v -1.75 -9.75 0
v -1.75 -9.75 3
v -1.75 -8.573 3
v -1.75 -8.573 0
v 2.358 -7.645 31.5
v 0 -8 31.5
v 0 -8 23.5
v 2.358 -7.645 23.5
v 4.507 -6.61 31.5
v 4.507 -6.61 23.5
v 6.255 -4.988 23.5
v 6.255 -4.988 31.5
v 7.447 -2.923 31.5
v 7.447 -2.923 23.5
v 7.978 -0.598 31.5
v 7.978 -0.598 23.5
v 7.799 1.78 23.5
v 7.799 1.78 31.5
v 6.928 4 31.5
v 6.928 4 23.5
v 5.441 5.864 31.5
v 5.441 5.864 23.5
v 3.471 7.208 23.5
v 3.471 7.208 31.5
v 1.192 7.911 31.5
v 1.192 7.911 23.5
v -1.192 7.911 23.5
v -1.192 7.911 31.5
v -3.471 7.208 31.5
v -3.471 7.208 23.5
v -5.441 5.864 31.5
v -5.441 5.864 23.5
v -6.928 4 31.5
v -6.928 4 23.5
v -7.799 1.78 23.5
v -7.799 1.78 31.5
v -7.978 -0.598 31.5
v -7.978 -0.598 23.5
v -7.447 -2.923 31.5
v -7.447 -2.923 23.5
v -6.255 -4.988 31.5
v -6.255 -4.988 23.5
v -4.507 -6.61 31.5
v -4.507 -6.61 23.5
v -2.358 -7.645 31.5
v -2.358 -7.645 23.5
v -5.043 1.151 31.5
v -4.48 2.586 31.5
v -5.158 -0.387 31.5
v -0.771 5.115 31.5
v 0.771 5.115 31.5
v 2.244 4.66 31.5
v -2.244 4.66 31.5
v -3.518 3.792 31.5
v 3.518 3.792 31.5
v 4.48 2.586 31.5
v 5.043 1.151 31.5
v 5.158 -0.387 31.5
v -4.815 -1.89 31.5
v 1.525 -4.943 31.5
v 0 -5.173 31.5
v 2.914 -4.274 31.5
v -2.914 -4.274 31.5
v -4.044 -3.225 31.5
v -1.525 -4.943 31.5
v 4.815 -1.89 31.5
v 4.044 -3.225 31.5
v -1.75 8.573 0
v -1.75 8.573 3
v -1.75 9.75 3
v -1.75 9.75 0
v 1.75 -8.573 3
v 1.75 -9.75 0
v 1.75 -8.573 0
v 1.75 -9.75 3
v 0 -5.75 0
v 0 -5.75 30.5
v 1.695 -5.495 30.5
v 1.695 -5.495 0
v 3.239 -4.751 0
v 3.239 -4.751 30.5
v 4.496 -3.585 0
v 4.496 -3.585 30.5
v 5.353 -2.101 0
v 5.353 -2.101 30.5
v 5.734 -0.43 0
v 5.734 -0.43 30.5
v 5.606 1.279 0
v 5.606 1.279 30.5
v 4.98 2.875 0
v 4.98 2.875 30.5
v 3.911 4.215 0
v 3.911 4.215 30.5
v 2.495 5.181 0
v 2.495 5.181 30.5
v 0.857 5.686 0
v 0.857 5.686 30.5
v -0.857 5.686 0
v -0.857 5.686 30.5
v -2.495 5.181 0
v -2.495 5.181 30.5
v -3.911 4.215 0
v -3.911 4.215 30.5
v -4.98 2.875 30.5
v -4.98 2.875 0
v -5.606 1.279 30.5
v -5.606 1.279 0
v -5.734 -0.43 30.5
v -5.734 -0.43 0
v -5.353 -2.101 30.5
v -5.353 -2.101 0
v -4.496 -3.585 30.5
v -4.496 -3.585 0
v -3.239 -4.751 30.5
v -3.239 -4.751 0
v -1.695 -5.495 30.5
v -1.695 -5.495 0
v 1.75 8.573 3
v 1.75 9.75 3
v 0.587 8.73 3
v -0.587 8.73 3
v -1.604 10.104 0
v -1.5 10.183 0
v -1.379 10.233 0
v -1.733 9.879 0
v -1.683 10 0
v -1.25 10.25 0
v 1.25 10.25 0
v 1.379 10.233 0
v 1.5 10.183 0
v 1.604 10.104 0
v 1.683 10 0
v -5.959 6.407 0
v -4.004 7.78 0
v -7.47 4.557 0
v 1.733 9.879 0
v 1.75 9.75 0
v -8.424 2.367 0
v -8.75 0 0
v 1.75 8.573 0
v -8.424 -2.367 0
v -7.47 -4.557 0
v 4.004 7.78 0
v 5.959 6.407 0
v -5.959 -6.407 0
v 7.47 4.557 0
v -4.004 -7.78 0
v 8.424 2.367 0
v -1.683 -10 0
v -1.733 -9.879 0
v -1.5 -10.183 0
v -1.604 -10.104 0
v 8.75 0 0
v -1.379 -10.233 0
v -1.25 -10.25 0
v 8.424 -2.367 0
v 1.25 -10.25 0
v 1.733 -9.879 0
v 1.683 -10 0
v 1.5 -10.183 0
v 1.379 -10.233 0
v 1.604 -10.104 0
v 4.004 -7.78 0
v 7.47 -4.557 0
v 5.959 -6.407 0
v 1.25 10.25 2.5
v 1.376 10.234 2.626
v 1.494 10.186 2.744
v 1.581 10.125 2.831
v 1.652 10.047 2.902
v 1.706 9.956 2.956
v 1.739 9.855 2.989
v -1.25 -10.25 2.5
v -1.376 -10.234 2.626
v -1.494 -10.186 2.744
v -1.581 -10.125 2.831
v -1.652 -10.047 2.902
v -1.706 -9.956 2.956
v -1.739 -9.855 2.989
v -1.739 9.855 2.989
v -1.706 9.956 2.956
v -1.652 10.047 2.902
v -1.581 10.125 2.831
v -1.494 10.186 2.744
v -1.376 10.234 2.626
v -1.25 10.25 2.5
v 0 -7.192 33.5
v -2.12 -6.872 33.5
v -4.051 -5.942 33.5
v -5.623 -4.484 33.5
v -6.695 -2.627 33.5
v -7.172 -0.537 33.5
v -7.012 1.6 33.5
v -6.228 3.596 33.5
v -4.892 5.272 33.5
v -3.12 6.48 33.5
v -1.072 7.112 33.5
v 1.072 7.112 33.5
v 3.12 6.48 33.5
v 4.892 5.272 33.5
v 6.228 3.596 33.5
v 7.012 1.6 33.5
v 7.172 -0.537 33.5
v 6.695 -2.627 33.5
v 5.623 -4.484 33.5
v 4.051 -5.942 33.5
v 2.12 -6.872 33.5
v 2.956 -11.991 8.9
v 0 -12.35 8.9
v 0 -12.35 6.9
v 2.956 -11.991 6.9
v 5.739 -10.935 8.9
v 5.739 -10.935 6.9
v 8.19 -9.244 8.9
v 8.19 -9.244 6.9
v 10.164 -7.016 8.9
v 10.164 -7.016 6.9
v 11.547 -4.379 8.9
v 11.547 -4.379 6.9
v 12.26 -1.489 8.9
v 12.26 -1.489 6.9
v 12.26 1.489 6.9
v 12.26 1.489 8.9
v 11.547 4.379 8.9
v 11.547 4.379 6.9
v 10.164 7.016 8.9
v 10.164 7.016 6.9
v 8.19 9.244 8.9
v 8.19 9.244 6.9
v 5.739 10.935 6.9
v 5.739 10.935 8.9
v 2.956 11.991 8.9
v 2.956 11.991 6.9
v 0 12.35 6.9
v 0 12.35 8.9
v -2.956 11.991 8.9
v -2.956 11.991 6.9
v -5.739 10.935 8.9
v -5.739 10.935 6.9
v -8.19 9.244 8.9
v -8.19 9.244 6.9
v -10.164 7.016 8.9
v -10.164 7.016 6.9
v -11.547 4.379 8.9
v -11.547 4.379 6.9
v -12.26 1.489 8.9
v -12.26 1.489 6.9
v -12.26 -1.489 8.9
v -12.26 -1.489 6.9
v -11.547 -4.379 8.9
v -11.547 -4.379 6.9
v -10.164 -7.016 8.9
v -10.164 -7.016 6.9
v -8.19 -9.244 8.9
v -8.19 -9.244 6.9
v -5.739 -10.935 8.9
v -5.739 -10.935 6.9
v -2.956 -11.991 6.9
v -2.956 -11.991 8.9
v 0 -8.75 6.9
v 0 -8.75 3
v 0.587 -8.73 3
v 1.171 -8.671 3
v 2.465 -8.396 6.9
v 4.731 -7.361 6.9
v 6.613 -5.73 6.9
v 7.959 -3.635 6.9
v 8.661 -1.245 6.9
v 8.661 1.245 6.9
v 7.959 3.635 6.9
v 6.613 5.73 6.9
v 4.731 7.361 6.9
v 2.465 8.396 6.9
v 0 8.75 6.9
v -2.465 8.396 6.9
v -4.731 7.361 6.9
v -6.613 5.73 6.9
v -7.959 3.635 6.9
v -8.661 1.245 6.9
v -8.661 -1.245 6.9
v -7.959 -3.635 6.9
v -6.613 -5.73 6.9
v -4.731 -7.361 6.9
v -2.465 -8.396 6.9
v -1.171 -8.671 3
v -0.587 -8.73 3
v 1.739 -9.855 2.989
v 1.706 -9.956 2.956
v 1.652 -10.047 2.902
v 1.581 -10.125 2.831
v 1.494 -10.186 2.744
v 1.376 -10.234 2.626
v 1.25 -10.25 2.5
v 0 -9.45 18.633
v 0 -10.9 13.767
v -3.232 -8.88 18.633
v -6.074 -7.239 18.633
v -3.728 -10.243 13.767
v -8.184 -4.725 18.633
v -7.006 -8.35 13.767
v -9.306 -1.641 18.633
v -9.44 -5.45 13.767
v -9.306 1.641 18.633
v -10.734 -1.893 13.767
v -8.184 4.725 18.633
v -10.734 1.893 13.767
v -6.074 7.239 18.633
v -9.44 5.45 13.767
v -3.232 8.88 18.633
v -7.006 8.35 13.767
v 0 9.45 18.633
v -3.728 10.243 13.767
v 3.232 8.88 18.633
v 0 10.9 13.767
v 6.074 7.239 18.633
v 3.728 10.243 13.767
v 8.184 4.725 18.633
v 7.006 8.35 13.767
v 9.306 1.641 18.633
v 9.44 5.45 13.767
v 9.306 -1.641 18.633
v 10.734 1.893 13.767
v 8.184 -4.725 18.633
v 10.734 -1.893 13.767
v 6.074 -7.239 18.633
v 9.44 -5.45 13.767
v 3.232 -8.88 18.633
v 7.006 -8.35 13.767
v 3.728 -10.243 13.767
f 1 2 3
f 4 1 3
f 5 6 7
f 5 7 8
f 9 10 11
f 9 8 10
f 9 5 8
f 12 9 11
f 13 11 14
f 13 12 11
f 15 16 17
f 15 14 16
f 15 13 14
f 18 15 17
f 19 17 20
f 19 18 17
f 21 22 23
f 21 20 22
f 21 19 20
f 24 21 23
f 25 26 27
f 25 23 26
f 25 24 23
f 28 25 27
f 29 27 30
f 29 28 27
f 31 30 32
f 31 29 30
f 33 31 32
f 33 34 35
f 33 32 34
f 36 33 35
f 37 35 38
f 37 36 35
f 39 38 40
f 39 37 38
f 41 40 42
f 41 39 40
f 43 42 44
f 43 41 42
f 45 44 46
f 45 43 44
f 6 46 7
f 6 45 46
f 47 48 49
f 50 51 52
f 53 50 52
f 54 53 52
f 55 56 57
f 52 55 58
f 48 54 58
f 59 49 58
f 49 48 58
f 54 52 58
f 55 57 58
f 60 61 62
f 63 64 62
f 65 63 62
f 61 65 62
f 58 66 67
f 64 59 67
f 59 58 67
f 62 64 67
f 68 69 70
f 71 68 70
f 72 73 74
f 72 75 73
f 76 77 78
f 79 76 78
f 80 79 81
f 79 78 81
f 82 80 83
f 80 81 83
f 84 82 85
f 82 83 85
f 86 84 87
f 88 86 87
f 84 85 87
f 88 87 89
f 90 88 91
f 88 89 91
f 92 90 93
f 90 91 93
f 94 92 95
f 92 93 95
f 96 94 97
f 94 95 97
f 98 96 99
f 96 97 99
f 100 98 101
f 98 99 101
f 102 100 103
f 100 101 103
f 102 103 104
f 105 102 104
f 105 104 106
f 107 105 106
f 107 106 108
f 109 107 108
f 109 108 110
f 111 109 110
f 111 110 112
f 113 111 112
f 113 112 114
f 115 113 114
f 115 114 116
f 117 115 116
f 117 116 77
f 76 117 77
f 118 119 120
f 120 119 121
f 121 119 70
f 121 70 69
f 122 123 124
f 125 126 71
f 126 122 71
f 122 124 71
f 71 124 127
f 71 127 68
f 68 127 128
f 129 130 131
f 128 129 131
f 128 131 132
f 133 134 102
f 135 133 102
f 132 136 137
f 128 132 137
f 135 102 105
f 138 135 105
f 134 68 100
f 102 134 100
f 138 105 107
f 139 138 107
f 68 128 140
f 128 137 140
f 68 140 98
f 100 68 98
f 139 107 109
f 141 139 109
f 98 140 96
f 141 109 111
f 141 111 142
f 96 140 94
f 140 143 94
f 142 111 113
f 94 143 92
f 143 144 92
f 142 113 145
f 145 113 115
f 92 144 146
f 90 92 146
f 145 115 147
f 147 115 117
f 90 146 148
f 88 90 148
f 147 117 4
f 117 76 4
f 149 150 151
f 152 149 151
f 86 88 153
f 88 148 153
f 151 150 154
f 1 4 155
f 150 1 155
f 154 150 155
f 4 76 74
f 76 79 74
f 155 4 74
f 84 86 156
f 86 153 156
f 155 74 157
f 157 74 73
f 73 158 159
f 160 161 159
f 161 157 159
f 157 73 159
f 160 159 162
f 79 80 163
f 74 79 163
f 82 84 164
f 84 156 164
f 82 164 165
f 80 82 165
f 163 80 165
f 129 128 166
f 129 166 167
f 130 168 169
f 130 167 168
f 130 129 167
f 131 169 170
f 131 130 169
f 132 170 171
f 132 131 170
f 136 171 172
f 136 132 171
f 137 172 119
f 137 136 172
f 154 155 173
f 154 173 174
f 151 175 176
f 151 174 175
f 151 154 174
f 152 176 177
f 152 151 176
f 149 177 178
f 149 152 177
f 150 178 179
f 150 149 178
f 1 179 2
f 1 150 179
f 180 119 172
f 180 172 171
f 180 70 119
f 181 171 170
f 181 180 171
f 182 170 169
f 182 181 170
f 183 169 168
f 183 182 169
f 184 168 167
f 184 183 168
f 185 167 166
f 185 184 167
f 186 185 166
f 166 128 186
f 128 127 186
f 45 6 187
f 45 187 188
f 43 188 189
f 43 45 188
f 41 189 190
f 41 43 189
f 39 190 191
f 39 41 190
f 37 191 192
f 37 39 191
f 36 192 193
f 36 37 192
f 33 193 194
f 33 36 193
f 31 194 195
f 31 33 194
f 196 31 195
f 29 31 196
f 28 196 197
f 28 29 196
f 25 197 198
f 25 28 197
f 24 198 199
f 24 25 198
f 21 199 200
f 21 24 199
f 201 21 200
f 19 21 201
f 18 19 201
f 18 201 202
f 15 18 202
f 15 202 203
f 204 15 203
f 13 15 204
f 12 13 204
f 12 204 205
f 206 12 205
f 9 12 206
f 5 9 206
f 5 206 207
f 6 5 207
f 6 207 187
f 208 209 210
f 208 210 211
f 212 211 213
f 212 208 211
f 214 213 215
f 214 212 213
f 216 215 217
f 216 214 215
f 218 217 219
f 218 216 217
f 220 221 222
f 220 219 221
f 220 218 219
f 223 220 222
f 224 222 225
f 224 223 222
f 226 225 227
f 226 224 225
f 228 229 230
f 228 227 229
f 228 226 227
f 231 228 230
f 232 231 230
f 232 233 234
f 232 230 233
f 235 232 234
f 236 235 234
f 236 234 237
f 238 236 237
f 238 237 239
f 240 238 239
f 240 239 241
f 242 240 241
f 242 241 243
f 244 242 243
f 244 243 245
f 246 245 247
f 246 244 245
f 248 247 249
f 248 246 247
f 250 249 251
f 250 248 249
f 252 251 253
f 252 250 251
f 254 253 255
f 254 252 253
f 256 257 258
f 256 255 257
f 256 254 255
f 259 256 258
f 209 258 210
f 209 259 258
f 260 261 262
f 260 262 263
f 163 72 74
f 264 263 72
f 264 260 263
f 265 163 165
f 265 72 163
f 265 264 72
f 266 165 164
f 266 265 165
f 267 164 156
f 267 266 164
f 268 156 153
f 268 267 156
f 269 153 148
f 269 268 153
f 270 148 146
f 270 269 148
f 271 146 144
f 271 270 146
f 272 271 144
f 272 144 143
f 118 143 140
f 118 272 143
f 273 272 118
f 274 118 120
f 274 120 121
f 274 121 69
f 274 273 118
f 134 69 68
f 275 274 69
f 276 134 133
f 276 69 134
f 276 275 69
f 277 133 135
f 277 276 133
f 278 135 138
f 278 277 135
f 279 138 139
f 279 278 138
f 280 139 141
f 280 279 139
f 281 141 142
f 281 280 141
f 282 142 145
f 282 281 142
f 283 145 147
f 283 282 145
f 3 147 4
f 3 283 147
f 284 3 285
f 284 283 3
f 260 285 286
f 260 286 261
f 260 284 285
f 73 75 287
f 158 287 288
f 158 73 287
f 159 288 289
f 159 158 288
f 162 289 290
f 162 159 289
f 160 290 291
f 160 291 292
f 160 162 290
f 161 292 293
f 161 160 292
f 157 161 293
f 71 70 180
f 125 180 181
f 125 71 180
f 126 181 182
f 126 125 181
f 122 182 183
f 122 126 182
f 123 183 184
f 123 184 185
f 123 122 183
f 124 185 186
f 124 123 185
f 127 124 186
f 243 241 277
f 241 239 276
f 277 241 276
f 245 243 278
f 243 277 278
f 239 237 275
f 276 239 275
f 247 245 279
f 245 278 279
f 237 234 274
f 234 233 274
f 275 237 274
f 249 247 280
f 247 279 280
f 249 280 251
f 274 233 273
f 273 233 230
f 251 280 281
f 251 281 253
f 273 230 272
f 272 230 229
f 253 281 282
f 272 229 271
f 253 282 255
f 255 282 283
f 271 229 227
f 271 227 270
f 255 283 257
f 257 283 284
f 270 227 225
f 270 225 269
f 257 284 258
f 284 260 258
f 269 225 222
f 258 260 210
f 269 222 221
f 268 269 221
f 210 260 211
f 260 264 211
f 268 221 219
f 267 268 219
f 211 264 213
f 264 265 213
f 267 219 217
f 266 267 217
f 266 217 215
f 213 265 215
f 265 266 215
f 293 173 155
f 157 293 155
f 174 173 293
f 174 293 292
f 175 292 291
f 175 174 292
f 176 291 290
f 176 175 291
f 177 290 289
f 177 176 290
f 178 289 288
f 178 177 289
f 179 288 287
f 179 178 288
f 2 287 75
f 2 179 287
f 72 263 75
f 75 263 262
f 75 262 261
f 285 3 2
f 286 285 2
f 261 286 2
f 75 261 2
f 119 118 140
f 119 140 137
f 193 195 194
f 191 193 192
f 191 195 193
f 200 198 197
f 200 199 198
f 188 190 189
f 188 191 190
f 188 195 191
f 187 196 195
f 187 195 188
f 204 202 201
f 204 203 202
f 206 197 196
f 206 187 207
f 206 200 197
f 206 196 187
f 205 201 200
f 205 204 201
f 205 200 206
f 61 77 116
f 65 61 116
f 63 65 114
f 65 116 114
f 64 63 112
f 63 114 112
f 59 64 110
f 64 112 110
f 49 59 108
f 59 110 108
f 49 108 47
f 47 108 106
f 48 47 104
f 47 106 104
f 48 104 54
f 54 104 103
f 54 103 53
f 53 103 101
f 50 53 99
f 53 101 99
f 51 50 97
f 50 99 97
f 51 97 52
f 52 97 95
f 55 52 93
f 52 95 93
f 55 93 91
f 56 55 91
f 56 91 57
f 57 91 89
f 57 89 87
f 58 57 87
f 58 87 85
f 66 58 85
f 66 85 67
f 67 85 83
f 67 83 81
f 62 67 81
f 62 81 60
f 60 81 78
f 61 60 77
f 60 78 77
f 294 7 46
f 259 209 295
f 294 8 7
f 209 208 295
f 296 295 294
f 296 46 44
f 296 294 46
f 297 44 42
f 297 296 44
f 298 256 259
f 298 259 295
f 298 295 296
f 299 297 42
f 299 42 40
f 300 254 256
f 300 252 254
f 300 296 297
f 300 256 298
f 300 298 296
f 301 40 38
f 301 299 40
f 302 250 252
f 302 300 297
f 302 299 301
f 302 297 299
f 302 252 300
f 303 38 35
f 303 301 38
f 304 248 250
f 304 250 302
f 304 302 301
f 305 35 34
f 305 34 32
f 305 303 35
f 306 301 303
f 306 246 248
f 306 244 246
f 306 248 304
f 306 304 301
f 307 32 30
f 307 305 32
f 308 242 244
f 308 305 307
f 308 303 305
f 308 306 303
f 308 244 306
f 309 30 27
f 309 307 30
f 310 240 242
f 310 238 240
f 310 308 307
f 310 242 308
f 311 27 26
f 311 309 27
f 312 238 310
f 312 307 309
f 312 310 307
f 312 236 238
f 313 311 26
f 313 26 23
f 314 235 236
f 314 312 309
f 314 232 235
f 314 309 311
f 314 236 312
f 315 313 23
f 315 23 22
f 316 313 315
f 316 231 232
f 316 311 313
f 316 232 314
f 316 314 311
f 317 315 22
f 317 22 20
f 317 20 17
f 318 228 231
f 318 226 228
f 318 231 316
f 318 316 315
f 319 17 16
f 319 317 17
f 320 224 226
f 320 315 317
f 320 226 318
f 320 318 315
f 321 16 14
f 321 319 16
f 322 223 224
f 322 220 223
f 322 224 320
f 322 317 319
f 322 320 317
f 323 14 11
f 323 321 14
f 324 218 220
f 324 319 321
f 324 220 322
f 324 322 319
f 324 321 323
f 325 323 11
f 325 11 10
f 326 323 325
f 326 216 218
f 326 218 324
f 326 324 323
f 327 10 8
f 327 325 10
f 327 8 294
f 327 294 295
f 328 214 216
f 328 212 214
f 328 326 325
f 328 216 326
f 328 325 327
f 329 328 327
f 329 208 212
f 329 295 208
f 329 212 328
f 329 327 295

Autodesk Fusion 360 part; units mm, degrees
sketch "Sketch1" plane through (0, 0, 0) normal (1, 0, 0) x (0, 1, 0)
  line L0 (-8.75, 0) -> (-8.75, 6.9)
  line L1 (0, 0) -> (0, 67)
  line L2 (0, 0) -> (-8.75, 0)
  line L3 (-8.75, 6.9) -> (-12.35, 6.9)
  line L4 (-12.35, 6.9) -> (-12.35, 8.9)
  line L5 (-12.35, 8.9) -> (-8, 23.5)
  line L6 (-5.75, 0) -> (-5.75, 31.5)
  line L7 (-5.75, 31.5) -> (0, 31.5)
  line L8 (0, 0) -> (-13.7425, 0)
  line L9 (-8, 23.5) -> (-8, 31.5)
  line L10 (-8, 31.5) -> (-7.1919, 33.5)
  line L11 (-7.1919, 33.5) -> (0, 33.5)
  dimension "d1" = 8.75
  dimension "d2" = 13.7425
  dimension "d3" = 6.9
  dimension "d4" = 3.6
  dimension "d5" = 2
  dimension "d6" = 3
  dimension "d8" = 31.5
  dimension "d10" = 8
  dimension "d11" = 8
  dimension "d13" = 8
  dimension "d25" = 22
  dimension "d26" = 2
  dimension "d27" = 2
revolve "Revolve1" add sketch "Sketch1" angle 360 about axis through (0, 0, 0) along (0, 0, 1) contours L0 L1 L2 L3 L4 L5 L6 L7 L8 L9 L10 L11
sketch "Sketch2" plane through (0, 0, 0) normal (1, 0, 0) x (0, 1, 0)
  line L0 (-8.75, 3) -> (-10.25, 3)
  line L1 (-10.25, 3) -> (-10.25, 0)
  line L2 (-10.25, 0) -> (-8.75, 0)
  line L3 (-8.75, 0) -> (-8.75, 3)
  line L4 (-8.75, 0) -> (-8.75, 6.9)
  line L5 (-8.75, 3) -> (-7.5, 3)
  line L6 (-7.5, 3) -> (-7.5, 0)
  line L7 (-7.5, 0) -> (-8.75, 0)
  line L8 (-8.75, 0) -> (-8.75, 3)
  dimension "d15" = 3
  dimension "d16" = 1.5
extrude "Extrude1" add sketch "Sketch2" along normal mid plane 3.5
mirror "Mirror1" about plane through (0, 0, 0) normal (0, 1, 0) of "Revolve1", "Extrude1"
fillet "Fillet1" radius 0.5 6 edges at (-1.75, -10.25, 1.5) (0, -10.25, 3) (1.75, -10.25, 1.5) (1.75, 10.25, 1.5) (0, 10.25, 3) (-1.75, 10.25, 1.5)
chamfer "Chamfer1" distance 1 angle 30 1 edges at (-5.3609, -2.0793, 31.5) measured on face at (-0.5725, -5.7214, 21)
equation "d1 = ( 17.5 / 2 ) * 1 mm"
equation "d17 = ( 3.5 / 2 ) * 1 mm"
